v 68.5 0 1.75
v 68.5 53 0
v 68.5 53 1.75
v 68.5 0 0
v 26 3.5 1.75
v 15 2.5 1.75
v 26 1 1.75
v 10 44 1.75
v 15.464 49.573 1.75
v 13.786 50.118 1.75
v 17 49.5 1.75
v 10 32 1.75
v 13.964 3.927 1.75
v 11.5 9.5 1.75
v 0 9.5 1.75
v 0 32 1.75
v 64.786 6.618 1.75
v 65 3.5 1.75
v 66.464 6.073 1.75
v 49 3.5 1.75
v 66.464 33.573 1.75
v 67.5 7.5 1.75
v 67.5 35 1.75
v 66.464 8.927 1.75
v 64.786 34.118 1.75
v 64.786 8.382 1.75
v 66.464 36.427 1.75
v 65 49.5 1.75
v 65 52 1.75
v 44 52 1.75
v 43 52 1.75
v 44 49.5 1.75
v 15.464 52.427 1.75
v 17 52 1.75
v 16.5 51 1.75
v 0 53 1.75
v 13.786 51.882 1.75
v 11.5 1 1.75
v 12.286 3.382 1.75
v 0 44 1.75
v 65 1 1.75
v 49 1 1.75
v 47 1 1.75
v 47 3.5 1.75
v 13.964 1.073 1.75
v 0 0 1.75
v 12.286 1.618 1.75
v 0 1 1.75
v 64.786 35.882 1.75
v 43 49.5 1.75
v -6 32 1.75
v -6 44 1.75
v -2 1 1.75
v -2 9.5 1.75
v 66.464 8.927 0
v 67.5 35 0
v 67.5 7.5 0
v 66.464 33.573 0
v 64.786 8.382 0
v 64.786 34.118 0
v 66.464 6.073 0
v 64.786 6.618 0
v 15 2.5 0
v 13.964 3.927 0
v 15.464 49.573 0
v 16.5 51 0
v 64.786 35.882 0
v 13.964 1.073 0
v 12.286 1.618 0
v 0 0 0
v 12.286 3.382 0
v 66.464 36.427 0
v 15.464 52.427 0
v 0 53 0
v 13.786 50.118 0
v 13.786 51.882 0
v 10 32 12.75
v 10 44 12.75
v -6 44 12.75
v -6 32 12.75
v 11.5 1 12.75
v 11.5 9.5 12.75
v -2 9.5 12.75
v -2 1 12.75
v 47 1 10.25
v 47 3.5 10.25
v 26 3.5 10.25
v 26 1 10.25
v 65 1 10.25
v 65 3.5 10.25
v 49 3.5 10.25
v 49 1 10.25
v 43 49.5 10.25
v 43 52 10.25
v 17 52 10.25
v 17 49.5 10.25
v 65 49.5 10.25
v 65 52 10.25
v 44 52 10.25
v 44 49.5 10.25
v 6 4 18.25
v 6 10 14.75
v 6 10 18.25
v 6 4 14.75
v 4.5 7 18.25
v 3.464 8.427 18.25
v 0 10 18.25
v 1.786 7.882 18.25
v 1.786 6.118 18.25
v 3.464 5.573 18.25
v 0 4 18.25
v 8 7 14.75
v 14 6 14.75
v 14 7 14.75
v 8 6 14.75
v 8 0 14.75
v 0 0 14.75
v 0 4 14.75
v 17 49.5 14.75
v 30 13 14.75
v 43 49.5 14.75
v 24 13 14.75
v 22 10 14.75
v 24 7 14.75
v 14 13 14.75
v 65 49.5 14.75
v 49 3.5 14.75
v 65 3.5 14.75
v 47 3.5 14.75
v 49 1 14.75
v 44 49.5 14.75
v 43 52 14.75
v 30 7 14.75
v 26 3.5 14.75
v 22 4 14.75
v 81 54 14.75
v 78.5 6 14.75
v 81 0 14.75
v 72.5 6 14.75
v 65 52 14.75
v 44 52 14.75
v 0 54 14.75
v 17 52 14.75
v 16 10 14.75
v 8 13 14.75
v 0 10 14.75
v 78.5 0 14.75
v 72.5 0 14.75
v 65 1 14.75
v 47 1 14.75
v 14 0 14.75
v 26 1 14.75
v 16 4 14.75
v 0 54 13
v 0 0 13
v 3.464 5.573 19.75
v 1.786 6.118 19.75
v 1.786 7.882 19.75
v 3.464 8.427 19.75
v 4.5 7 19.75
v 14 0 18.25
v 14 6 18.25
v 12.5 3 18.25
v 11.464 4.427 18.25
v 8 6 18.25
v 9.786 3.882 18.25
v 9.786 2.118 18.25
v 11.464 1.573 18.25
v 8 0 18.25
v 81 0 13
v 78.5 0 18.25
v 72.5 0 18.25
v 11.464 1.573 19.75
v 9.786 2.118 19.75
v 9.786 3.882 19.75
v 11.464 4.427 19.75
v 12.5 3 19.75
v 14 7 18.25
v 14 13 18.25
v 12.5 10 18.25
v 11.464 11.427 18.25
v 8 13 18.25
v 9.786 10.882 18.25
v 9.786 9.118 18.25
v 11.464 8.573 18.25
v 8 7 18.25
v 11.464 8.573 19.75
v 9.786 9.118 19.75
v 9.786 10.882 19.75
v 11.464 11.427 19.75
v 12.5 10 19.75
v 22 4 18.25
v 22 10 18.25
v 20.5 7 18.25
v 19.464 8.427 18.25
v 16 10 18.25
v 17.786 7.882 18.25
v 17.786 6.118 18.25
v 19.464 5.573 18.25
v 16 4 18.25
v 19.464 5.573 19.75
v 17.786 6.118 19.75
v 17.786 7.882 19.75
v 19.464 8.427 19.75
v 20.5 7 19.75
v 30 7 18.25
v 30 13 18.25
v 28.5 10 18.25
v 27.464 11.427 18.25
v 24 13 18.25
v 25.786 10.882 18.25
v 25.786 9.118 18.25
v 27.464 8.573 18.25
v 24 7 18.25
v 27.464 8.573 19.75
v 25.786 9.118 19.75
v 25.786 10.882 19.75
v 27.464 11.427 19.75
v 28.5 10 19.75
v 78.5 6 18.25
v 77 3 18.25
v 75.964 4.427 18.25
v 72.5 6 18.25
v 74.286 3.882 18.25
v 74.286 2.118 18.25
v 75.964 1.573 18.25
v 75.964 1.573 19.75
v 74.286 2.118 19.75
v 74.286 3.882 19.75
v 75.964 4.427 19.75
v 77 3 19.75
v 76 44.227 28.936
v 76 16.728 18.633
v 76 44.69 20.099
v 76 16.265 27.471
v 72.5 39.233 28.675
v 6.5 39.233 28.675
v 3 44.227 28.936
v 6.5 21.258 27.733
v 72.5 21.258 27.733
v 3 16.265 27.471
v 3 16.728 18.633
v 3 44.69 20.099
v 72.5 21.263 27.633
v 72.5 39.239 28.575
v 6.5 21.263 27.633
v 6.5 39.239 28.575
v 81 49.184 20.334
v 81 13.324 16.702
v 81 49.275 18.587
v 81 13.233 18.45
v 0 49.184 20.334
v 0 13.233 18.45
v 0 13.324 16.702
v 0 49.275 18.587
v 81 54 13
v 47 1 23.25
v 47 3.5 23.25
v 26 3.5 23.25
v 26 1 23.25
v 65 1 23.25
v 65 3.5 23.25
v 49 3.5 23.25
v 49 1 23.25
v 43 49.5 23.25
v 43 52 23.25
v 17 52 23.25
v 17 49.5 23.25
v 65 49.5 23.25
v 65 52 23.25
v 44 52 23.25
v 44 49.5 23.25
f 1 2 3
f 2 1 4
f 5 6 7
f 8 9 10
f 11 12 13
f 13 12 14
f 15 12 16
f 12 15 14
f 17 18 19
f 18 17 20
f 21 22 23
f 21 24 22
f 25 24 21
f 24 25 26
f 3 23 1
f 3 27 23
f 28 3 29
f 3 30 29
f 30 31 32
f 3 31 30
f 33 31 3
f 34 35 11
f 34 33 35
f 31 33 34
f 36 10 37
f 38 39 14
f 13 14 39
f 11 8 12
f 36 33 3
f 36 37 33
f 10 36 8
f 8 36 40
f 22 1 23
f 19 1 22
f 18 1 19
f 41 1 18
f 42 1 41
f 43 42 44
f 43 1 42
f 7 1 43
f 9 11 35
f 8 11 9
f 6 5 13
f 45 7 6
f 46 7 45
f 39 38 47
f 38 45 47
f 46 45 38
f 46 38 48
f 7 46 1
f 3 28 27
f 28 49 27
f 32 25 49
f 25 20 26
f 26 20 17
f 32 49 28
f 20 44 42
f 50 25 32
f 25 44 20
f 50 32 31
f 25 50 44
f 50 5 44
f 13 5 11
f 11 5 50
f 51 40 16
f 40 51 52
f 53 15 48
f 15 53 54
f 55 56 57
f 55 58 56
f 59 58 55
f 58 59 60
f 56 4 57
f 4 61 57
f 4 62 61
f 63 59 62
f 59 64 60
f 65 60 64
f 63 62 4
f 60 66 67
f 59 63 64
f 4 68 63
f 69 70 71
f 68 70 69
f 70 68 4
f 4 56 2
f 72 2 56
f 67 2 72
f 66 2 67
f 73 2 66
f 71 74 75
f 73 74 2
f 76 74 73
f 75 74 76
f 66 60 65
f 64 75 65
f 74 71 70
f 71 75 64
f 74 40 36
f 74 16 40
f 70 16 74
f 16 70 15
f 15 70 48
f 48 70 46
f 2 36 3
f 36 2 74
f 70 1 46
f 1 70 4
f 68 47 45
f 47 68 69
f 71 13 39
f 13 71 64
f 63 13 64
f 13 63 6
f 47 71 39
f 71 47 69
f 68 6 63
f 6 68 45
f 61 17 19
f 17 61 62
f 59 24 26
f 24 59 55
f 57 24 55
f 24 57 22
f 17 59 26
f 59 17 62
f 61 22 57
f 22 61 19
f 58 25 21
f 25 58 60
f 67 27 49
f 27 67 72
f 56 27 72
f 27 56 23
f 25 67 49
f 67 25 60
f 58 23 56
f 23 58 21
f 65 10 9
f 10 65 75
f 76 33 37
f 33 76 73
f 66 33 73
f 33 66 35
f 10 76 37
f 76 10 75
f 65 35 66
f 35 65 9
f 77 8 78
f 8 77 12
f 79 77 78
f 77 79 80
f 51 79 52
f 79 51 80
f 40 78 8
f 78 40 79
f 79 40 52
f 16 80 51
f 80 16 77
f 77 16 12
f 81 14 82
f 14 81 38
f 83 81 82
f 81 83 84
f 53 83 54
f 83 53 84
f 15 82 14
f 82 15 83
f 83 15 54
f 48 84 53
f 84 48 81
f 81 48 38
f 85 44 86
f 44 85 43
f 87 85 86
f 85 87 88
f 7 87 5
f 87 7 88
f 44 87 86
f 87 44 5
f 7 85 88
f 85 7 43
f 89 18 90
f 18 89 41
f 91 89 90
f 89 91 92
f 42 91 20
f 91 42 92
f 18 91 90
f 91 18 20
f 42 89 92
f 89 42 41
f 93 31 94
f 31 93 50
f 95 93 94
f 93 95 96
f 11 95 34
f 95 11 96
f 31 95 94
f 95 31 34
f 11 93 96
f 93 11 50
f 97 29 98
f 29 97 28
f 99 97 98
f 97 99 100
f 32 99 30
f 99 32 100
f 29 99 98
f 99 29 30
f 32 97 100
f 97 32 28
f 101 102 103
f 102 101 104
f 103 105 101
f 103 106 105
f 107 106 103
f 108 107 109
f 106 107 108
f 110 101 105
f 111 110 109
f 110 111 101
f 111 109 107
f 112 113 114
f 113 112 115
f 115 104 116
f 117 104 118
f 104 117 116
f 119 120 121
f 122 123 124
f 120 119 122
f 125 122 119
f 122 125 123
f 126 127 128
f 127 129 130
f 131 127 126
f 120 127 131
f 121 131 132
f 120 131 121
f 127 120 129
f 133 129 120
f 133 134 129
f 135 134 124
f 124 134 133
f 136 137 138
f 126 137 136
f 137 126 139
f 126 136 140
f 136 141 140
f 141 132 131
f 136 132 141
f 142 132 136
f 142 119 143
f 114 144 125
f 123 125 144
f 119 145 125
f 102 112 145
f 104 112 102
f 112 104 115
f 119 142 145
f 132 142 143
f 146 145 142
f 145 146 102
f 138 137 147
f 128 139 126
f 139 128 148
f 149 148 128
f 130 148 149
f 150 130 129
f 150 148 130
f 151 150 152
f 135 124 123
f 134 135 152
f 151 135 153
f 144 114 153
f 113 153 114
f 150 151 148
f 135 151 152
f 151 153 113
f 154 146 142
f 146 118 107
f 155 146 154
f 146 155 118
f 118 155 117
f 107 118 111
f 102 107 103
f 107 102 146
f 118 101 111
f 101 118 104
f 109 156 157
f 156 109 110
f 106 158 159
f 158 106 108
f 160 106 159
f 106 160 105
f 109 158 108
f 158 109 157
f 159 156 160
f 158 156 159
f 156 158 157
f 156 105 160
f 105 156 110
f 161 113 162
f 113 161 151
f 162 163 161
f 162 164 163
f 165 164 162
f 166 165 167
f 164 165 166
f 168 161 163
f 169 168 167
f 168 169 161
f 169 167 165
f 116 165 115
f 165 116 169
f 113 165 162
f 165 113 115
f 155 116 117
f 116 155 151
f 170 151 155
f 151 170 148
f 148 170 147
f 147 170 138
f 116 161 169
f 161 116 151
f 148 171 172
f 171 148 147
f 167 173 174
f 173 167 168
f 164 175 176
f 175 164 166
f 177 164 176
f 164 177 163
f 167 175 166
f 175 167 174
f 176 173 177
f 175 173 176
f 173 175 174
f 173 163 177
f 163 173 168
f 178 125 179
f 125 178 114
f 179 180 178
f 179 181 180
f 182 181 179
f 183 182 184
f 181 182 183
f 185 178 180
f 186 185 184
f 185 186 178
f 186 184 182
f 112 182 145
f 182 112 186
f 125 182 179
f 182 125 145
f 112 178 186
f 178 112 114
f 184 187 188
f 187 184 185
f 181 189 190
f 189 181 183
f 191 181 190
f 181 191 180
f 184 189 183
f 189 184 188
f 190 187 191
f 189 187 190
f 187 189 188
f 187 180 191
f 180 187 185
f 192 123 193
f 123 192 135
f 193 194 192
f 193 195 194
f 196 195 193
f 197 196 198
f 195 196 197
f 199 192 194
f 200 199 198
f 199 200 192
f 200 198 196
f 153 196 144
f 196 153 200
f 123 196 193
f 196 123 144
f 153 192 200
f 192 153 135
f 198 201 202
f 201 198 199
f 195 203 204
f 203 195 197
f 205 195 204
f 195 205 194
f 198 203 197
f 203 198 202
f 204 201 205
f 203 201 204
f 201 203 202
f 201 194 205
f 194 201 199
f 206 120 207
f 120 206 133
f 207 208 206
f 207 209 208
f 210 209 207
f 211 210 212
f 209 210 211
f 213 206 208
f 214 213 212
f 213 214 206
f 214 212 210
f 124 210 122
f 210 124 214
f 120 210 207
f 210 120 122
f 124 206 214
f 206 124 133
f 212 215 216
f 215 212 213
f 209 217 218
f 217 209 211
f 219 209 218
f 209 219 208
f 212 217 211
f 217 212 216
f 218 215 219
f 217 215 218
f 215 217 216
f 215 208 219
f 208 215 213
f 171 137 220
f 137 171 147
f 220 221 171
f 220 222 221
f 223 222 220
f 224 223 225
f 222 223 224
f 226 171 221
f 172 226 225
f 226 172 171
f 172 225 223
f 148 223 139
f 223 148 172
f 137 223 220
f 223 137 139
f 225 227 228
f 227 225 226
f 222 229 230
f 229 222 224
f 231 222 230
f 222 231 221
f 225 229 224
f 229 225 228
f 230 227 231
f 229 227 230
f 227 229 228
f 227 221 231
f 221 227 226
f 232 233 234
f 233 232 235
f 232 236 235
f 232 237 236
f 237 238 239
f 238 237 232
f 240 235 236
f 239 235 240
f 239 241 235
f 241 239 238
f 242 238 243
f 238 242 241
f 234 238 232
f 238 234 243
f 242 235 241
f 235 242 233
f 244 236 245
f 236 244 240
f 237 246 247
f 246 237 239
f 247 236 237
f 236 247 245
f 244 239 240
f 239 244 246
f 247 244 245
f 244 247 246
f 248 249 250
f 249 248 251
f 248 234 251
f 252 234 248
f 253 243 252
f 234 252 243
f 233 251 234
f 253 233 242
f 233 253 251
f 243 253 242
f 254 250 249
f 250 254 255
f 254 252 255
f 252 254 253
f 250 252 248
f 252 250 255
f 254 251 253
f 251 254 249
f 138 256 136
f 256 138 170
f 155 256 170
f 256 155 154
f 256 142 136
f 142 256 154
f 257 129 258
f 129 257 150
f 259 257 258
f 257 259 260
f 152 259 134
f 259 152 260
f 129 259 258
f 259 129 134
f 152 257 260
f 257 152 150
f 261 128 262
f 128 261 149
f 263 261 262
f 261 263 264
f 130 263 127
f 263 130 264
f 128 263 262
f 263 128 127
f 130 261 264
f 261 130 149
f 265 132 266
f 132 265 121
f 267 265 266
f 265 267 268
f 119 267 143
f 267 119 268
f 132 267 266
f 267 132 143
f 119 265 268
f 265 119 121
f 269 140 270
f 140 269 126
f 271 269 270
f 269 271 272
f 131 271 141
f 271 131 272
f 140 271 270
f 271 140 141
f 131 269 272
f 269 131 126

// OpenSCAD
// Arduino Components for the LightClock project
//
// Pierre Cauchois (pierreca)
// 5/18/2014

pcb_thickness = 1.75;

module button(x, y) {
	translate([x,y,0]) {
		color("silver") cube(size=[6, 6, 3.5]);
		color("black") translate([3, 3, 0]) cylinder(h=5, r=1.5);
	}
}

module buttons(x, y, z) {
	translate([x, y, z]) {
		button(x, y + 4);
		button(x + 8, y);
		button(x + 8, y + 7);
		button(x + 16, y + 4);
		button(x + 24, y + 7);
		button(x + 72.5, y);
		
	}
}

module lcd_16x2(x, y, z) {
	translate([x, y, z]) {
		color("darkgrey") difference () {
			cube(size=[73, 28, 9]);
			translate([3.5, 5, 8.6]) cube(size=[66, 18, 0.5]);
		}
		color("darkgreen") translate([3.5, 5, 8.4]) cube(size=[66, 18, 0.5]);
	}
}

module pcb(width_x, height_y) {
	color("teal") cube(size=[width_x, height_y, pcb_thickness]);
}

module arduino (x, y, z) {
	translate([x, y, z]) {
		difference() {
			pcb(68.5, 53); 	// Arduino PCB (w/ screw holes)
			translate([13.5,2.5,0]) cylinder(h=2, r=1.5);
			translate([66,7.5,0]) cylinder(h=2, r=1.5);
			translate([66,35,0]) cylinder(h=2, r=1.5);
			translate([15,51,0]) cylinder(h=2, r=1.5);
		}
		color("silver") translate([-6, 32, pcb_thickness]) cube (size=[16, 12, 11]); // USB port
		color("black") translate([-2, 1, pcb_thickness]) cube (size=[13.5, 8.5, 11]); // Power jack
		color("black") translate([26, 1, pcb_thickness]) cube (size=[21, 2.5, 8.5]); // Header
		color("black") translate([49, 1, pcb_thickness]) cube (size=[16, 2.5, 8.5]); // Header
		color("black") translate([17, 49.5, pcb_thickness]) cube (size=[26, 2.5, 8.5]); // Header
		color("black") translate([44, 49.5, pcb_thickness]) cube (size=[21, 2.5, 8.5]); // Header
	}
}

module adafruit_lcd_shield(x, y, z) {
	translate([x, y, z]) {
		pcb(81, 54); // base PCB
		color("black") translate([26, 1, pcb_thickness]) cube (size=[21, 2.5, 8.5]); // Header
		color("black") translate([49, 1, pcb_thickness]) cube (size=[16, 2.5, 8.5]); // Header
		color("black") translate([17, 49.5, pcb_thickness]) cube (size=[26, 2.5, 8.5]); // Header
		color("black") translate([44, 49.5, pcb_thickness]) cube (size=[21, 2.5, 8.5]); // Header
		buttons(0, 0, pcb_thickness); // buttons
		rotate ([3,0,0]) translate([0, 13.5, 3]) { 
			pcb(81, 36); // screen PCB
			lcd_16x2(3, 3.5, 1.6); // LCD
		}
	}
}

module arduino_lcd_shield(x, y, z) {
	arduino(x, y, z);
	adafruit_lcd_shield(x, y, z + 13);
}

arduino_lcd_shield(0, 0, 0);
